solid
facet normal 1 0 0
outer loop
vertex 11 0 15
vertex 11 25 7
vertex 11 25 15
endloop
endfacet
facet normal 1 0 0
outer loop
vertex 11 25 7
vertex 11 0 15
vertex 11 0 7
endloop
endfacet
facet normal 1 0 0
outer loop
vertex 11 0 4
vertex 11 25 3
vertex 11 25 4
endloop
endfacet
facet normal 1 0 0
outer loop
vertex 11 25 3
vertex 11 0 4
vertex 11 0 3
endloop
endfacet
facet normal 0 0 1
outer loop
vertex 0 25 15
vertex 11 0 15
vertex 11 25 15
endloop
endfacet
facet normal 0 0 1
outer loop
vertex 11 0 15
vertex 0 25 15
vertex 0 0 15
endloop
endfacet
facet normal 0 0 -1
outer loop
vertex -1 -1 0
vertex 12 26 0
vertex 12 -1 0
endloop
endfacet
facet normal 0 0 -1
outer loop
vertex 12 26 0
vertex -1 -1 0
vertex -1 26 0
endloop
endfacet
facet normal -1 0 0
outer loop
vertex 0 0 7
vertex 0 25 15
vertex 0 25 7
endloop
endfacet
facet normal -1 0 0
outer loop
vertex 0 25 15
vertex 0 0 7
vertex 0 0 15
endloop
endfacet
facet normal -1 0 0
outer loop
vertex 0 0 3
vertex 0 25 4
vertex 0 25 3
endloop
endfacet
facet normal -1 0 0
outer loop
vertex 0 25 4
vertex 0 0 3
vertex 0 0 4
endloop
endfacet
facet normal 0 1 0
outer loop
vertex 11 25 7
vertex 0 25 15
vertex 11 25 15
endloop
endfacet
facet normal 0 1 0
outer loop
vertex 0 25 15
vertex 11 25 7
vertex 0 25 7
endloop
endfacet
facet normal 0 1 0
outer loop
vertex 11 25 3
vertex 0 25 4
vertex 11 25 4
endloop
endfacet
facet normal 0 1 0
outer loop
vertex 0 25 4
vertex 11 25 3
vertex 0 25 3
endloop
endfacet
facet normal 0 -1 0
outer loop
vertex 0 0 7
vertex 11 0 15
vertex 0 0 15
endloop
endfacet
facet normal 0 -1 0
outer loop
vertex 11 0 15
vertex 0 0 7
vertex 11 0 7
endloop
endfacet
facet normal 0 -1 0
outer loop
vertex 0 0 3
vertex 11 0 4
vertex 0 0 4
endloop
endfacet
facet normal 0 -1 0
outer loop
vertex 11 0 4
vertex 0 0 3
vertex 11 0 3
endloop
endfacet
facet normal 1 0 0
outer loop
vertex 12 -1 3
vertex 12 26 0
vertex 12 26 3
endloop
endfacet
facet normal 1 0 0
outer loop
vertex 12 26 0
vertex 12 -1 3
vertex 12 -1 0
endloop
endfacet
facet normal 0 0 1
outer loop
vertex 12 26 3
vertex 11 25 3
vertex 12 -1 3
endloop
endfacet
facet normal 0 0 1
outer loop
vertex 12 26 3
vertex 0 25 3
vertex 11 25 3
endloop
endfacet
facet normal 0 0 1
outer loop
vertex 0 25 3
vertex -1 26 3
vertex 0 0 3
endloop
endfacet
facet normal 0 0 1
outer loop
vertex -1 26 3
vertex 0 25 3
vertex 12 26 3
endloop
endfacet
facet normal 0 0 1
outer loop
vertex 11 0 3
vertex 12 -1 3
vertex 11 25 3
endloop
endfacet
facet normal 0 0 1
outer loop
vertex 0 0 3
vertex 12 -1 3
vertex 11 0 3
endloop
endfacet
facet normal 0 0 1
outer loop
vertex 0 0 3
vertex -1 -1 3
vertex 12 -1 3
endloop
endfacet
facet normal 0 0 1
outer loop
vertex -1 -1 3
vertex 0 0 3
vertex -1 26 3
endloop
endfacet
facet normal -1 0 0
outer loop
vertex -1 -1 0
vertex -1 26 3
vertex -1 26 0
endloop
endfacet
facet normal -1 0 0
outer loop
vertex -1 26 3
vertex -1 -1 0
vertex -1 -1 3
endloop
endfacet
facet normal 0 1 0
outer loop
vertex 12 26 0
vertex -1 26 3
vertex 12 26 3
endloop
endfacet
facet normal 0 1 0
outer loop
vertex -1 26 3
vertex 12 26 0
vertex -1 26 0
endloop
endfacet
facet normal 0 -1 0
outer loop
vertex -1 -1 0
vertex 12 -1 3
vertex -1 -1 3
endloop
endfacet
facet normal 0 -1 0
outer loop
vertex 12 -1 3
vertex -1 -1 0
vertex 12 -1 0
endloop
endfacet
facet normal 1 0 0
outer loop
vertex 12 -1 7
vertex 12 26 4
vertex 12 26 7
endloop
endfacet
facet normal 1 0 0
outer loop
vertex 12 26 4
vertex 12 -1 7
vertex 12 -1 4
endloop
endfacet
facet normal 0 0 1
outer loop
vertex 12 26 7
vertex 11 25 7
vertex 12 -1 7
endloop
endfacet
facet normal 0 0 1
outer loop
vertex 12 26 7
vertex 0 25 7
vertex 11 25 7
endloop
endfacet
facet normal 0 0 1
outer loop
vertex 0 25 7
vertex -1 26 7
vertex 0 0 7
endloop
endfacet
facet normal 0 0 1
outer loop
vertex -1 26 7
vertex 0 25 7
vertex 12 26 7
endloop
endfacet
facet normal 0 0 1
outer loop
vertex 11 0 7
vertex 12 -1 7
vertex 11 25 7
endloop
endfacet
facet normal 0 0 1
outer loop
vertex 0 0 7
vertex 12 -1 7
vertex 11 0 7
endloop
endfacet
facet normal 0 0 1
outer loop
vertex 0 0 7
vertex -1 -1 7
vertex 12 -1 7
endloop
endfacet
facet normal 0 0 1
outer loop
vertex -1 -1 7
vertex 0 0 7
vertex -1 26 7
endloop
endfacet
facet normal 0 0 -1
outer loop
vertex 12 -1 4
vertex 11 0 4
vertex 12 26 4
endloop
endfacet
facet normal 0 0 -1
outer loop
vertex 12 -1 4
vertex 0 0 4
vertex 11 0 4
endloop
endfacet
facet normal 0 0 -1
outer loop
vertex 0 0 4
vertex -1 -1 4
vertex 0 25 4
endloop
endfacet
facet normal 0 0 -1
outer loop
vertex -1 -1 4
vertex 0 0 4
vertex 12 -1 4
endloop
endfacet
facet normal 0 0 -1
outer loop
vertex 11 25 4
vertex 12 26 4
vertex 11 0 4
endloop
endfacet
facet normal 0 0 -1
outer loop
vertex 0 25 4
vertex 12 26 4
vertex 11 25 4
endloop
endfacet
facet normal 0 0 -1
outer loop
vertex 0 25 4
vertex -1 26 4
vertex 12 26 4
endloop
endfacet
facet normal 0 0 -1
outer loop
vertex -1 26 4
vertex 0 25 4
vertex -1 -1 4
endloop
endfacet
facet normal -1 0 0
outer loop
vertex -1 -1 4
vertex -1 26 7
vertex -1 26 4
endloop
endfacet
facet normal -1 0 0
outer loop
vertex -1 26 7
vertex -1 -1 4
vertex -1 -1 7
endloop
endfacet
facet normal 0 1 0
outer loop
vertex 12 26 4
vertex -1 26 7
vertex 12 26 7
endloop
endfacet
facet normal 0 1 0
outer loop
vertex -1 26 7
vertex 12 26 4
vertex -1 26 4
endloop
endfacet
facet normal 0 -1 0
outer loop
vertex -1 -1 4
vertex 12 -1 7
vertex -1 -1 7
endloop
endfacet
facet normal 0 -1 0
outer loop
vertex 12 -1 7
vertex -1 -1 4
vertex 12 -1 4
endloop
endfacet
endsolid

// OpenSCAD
cube(size=[11,25,15]);
translate([-1,-1,0]) cube(size=[13,27,3]);
translate([-1,-1,4]) cube(size=[13,27,3]);
